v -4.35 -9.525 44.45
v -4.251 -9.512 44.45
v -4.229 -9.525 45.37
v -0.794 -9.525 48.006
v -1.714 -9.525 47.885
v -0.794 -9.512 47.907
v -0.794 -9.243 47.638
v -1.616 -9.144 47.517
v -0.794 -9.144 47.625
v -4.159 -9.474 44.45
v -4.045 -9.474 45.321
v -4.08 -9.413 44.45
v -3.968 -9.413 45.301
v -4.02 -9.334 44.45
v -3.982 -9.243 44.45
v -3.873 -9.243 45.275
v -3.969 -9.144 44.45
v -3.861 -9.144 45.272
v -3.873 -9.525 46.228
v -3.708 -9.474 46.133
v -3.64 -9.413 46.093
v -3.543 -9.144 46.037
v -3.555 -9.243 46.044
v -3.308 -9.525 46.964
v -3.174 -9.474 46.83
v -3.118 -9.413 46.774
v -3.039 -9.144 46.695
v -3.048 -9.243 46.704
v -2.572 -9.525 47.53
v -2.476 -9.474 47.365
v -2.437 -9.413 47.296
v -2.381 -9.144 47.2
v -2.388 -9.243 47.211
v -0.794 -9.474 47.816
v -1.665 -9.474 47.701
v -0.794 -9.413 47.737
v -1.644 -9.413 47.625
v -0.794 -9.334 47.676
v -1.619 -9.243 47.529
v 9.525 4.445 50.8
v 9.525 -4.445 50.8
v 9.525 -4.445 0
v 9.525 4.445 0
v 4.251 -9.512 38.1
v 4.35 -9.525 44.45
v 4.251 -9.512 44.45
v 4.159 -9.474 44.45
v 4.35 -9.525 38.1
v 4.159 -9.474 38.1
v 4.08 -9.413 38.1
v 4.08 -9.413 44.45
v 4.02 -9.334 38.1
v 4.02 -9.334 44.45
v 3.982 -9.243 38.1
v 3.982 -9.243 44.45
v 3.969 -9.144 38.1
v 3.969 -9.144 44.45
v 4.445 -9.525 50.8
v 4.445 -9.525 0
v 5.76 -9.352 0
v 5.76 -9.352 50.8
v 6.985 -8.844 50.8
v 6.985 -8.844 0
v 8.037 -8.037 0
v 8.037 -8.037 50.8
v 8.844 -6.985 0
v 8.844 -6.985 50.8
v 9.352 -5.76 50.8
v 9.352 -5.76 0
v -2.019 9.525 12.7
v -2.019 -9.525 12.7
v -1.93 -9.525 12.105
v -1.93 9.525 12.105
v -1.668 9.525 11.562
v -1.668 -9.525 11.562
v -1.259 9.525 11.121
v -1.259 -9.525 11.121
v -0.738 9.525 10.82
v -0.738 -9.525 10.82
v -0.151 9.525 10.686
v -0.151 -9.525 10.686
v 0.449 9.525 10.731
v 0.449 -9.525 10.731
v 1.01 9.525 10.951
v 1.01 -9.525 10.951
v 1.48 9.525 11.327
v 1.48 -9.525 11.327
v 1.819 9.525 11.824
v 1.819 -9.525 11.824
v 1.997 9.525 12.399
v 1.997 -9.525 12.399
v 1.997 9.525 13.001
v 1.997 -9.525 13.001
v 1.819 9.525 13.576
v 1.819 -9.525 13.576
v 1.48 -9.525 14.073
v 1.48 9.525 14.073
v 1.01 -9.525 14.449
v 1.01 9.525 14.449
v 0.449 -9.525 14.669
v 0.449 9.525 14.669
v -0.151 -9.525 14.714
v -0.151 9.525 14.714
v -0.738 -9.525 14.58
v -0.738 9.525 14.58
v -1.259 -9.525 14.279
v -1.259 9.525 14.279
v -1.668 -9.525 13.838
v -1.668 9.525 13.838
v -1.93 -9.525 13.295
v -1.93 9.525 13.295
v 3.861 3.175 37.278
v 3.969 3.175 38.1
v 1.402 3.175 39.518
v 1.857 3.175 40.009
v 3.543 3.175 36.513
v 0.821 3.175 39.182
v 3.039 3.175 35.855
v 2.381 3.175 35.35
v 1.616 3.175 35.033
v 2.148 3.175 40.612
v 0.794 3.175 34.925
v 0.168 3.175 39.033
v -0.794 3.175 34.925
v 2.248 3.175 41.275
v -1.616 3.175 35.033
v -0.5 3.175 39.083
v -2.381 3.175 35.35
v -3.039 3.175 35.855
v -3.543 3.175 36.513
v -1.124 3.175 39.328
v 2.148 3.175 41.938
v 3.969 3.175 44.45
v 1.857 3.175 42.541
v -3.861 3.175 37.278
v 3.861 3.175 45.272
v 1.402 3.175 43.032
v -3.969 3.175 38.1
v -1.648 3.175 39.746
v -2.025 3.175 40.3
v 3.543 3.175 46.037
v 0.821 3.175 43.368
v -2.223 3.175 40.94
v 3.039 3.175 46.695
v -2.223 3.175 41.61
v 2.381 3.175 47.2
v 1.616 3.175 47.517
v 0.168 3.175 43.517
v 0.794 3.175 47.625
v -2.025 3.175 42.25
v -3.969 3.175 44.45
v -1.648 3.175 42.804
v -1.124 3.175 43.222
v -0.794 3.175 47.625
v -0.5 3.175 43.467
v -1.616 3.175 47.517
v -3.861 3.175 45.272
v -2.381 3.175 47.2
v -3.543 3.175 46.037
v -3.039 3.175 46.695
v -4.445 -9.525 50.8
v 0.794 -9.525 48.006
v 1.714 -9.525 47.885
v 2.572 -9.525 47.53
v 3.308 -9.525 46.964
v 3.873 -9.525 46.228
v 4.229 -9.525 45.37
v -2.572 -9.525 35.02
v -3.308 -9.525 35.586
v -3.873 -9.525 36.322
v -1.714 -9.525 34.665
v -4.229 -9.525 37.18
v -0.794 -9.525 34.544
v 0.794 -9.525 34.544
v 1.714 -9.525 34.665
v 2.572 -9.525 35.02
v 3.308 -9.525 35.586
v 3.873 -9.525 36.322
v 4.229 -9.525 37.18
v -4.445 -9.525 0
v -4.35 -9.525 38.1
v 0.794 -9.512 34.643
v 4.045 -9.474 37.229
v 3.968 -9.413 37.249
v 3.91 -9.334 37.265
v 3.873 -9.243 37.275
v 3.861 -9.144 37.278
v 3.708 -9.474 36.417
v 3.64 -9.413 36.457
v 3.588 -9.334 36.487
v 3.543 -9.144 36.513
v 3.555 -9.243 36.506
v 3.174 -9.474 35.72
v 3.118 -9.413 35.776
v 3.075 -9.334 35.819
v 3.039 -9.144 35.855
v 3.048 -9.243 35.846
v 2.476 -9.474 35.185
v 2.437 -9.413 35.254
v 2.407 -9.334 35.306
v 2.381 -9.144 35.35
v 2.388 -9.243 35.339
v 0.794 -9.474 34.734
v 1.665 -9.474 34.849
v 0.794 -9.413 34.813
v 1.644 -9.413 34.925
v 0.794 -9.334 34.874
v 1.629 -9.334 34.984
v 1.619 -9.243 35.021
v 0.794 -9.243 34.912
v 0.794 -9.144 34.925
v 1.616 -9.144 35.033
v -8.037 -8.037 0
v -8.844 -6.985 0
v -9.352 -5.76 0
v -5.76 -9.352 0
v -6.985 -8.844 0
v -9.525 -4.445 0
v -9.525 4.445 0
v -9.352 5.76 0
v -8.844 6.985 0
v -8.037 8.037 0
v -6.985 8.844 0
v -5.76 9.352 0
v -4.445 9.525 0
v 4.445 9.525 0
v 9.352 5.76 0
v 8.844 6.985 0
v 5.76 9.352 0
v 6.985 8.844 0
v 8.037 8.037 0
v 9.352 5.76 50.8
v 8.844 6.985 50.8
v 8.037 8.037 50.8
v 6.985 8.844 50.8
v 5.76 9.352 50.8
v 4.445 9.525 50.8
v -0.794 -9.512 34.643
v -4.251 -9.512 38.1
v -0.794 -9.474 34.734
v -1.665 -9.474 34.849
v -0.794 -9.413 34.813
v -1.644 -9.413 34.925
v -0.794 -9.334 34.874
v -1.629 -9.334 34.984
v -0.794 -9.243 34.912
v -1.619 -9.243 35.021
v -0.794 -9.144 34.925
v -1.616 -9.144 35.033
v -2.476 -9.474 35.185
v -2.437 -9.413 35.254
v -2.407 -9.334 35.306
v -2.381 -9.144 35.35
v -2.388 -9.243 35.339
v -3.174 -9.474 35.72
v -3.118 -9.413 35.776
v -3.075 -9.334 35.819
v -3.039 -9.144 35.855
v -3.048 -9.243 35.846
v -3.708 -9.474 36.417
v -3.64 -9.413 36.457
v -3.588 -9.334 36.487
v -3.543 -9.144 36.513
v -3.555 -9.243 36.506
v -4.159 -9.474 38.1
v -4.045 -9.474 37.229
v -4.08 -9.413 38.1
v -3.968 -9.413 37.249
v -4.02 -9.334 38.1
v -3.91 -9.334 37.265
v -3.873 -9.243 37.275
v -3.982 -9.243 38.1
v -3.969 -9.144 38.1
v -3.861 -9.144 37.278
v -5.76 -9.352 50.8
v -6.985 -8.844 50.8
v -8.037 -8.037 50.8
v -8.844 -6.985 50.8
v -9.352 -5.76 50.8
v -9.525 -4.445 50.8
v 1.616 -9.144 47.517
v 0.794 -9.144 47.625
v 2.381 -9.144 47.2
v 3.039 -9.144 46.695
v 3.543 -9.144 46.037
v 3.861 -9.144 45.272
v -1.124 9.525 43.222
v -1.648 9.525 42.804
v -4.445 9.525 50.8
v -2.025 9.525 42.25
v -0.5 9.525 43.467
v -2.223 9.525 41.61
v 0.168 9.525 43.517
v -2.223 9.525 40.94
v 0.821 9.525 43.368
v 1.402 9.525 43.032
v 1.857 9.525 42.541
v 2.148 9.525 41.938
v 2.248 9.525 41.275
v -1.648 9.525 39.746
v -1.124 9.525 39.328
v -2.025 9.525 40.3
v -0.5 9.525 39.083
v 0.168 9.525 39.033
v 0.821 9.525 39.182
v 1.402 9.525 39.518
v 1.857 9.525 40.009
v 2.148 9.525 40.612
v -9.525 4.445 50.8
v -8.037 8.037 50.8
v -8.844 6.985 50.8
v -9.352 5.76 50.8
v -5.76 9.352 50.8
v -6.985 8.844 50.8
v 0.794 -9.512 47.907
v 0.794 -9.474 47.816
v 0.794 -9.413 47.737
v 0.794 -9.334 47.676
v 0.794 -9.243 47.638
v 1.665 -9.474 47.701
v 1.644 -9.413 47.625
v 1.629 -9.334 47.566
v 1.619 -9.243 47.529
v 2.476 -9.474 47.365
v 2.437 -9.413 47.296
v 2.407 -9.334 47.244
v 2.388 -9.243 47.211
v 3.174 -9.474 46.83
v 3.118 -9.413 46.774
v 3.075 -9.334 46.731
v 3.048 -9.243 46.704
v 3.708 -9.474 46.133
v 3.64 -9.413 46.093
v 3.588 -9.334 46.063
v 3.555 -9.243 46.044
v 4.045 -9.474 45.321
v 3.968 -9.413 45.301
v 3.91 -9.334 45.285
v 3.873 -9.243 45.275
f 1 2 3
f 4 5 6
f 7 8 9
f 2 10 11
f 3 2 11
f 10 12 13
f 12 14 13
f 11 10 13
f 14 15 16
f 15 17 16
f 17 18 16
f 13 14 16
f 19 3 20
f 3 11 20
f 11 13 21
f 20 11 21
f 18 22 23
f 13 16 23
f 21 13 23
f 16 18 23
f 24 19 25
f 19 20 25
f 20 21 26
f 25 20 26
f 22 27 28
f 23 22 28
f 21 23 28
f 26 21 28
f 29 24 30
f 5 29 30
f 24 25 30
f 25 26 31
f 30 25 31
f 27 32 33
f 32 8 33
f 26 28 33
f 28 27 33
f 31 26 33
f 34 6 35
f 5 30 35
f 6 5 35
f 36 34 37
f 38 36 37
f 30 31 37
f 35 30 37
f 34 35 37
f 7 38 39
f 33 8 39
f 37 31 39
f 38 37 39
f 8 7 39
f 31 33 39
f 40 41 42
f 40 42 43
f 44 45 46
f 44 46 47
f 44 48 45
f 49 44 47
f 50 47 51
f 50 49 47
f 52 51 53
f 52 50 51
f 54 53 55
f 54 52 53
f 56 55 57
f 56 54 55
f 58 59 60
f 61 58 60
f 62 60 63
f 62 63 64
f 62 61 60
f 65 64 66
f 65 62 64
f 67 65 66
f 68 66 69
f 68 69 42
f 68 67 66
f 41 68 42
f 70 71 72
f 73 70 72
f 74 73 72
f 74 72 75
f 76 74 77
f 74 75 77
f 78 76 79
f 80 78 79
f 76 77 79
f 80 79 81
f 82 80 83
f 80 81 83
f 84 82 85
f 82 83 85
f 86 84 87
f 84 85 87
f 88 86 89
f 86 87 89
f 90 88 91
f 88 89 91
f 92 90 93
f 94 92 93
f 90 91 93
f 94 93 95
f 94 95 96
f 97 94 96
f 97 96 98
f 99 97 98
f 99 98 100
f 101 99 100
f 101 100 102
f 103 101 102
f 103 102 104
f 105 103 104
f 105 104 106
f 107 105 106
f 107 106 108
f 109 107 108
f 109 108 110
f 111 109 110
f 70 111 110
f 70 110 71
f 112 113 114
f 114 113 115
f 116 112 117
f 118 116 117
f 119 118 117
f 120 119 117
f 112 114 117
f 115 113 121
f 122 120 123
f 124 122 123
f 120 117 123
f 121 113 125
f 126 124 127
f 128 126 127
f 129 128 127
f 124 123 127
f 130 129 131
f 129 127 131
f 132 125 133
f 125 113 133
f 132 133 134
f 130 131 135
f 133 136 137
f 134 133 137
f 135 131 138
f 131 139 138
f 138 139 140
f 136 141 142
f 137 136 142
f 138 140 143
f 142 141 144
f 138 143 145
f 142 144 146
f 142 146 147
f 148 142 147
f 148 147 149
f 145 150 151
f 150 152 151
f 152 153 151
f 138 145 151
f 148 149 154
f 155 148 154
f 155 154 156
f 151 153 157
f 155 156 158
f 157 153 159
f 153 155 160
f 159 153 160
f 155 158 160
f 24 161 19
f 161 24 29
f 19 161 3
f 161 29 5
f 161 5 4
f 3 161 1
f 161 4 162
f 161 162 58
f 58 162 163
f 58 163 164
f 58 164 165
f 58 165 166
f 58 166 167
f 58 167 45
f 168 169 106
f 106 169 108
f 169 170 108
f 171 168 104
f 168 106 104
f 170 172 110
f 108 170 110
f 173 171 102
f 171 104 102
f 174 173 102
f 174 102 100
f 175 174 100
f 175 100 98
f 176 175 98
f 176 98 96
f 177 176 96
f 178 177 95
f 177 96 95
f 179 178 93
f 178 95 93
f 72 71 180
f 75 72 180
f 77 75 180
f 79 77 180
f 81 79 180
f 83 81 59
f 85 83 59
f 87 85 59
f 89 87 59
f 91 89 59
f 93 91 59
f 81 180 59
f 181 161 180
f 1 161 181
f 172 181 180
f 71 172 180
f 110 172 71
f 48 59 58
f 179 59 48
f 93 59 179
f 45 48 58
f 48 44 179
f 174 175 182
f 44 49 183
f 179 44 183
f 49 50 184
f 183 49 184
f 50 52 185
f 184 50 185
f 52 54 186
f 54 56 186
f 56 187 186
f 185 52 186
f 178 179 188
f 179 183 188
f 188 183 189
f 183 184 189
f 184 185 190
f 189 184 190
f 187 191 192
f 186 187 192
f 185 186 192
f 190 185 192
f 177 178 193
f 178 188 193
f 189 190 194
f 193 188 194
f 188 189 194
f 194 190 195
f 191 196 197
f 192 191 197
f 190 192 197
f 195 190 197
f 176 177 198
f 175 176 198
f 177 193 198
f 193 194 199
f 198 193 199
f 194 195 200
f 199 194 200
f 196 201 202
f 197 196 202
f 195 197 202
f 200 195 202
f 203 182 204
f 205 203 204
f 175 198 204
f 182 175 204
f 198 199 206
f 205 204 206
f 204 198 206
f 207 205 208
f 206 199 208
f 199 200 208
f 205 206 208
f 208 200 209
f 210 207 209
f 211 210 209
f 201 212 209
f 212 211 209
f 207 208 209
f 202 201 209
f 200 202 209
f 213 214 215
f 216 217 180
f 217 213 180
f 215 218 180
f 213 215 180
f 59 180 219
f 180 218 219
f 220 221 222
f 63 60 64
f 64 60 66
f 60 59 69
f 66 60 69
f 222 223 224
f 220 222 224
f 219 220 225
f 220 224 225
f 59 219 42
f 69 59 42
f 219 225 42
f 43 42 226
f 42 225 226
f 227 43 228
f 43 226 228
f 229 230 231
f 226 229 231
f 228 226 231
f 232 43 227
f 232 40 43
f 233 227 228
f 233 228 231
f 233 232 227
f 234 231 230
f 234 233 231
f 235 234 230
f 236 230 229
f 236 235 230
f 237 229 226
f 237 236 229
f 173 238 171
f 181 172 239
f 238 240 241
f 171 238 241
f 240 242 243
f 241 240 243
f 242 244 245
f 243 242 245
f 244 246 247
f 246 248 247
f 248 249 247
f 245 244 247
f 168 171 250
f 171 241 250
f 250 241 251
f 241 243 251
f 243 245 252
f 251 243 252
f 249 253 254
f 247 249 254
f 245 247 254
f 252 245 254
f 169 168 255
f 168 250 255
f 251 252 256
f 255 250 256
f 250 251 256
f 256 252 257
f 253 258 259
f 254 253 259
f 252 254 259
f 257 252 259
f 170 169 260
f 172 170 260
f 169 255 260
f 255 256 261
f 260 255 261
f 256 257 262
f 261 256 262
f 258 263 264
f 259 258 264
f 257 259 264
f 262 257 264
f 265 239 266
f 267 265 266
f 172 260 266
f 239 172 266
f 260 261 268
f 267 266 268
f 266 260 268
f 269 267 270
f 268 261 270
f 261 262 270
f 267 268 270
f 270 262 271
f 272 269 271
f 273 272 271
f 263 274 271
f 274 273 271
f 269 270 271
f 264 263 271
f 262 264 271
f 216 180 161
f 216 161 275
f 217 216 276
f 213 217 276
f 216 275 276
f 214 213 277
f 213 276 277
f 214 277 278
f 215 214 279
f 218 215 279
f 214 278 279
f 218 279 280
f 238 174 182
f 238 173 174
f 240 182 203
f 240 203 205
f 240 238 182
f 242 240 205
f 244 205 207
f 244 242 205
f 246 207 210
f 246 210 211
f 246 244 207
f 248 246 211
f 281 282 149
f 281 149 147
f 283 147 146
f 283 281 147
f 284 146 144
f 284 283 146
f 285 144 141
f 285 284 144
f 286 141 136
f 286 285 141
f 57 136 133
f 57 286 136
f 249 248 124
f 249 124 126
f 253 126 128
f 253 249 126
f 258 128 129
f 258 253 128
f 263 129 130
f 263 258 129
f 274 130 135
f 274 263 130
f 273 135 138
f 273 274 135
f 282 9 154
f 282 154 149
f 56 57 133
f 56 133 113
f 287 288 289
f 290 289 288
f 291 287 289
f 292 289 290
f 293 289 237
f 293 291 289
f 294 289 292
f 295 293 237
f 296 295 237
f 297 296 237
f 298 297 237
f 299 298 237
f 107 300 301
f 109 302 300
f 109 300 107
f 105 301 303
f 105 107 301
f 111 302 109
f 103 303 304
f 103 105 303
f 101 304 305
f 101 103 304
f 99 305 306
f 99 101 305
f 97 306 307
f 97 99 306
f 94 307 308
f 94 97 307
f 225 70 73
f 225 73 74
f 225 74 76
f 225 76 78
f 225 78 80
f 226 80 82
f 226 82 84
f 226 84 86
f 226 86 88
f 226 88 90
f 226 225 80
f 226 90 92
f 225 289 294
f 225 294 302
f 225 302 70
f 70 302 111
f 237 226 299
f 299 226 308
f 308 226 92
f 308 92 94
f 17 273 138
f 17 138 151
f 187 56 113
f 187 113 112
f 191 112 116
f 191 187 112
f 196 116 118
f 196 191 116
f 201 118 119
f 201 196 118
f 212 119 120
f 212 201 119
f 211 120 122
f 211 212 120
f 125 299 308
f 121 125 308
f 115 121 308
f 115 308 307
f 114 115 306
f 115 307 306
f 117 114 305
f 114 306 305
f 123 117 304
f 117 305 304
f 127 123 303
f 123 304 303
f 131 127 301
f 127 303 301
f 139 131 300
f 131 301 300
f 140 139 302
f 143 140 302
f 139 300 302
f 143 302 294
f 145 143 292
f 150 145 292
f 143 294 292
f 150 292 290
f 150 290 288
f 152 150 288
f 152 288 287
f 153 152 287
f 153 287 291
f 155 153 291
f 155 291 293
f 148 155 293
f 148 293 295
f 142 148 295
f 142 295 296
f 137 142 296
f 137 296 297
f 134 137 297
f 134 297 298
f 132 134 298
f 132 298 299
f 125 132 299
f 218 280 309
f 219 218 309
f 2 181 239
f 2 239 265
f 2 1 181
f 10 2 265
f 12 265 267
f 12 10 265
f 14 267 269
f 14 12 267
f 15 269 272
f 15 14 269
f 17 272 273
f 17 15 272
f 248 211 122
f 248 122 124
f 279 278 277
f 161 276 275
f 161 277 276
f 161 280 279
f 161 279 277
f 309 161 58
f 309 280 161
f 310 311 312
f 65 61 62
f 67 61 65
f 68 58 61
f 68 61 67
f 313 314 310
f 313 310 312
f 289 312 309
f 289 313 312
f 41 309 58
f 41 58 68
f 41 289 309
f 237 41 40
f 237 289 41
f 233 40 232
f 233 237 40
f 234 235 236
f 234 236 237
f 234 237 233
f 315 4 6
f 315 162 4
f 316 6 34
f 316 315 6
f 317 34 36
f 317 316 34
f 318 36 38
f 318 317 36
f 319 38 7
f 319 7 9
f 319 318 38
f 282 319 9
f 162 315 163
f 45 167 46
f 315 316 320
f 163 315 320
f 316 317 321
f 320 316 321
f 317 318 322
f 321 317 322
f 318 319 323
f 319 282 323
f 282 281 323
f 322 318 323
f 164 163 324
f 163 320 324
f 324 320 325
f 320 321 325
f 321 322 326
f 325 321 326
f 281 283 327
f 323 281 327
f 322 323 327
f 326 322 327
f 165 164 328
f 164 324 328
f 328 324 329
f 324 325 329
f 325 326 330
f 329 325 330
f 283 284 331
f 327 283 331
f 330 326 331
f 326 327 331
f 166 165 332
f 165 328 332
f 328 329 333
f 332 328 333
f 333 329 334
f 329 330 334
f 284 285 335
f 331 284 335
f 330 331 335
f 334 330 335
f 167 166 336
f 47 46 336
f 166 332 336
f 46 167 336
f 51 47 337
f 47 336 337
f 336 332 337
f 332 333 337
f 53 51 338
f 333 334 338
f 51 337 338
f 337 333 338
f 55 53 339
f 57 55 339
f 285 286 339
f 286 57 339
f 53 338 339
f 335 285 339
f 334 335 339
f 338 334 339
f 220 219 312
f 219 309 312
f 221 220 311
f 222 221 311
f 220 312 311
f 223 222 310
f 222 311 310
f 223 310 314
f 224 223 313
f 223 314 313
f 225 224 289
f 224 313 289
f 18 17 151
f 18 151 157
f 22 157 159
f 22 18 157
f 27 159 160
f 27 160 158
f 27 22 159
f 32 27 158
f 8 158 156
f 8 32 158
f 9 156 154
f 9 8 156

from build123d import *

# Parameters (mm, degrees)
SKETCH1_W              = 19.05
SKETCH1_H              = 19.05
BOSS_EXTRUDE1_DEPTH    = 50.8
CUT_EXTRUDE1_DEPTH     = 12.7
F_8_CLEARANCE_HOLE1_D  = 4.4958
FILLET1_R              = 0.381
F_10_32_TAPPED_HOLE1_D = 4.0386
FILLET2_R              = 5.08


with BuildPart() as part:
    # Sketch1 → Boss-Extrude1 (new body)
    with BuildSketch(Plane.XY):
        Rectangle(SKETCH1_W, SKETCH1_H)
    extrude(amount=BOSS_EXTRUDE1_DEPTH)

    # Sketch2 → Cut-Extrude1 (cut)
    with BuildSketch(Plane.XZ.offset(9.525)):
        with BuildLine():
            Line((-0.79375, 47.625), (0.79375, 47.625))
            ThreePointArc((0.79375, 47.625), (3.03881403, 46.69506403), (3.96875, 44.45))
            Line((3.96875, 44.45), (3.96875, 38.1))
            ThreePointArc((3.96875, 38.1), (3.03881403, 35.85493597), (0.79375, 34.925))
            Line((0.79375, 34.925), (-0.79375, 34.925))
            ThreePointArc((-0.79375, 34.925), (-3.03881403, 35.85493597), (-3.96875, 38.1))
            Line((-3.96875, 38.1), (-3.96875, 44.45))
            ThreePointArc((-3.96875, 44.45), (-3.03881403, 46.69506403), (-0.79375, 47.625))
        make_face()
    extrude(amount=-CUT_EXTRUDE1_DEPTH, mode=Mode.SUBTRACT)

    # #8 Clearance Hole1 (through all)
    with Locations(Plane(origin=(0, 3.175, 0), x_dir=(-1, 0, 0), z_dir=(0, -1, 0))):
        with Locations((0, -41.275)):
            Hole(F_8_CLEARANCE_HOLE1_D / 2)

    # Fillet1
    fillet1_edges = [part.edges().sort_by_distance(p)[0] for p in [
        (0, -9.525, 47.625),
        (3.96875, -9.525, 41.275),
        (-3.03881403, -9.525, 46.69506403),
        (-3.96875, -9.525, 41.275),
        (-3.03881403, -9.525, 35.85493597),
        (0, -9.525, 34.925),
        (3.03881403, -9.525, 35.85493597),
        (3.03881403, -9.525, 46.69506403),
    ]]
    fillet(fillet1_edges, radius=FILLET1_R)

    # #10-32 Tapped Hole1 (through all)
    with Locations(Plane(origin=(0, 9.525, 0), x_dir=(1, 0, 0), z_dir=(0, 1, 0))):
        with Locations((0, -12.7)):
            Hole(F_10_32_TAPPED_HOLE1_D / 2)

    # Fillet2
    fillet2_edges = [part.edges().sort_by_distance(p)[0] for p in [
        (9.525, -9.525, 25.4),
        (-9.525, -9.525, 25.4),
        (-9.525, 9.525, 25.4),
        (9.525, 9.525, 25.4),
    ]]
    fillet(fillet2_edges, radius=FILLET2_R)


solid = part.part
